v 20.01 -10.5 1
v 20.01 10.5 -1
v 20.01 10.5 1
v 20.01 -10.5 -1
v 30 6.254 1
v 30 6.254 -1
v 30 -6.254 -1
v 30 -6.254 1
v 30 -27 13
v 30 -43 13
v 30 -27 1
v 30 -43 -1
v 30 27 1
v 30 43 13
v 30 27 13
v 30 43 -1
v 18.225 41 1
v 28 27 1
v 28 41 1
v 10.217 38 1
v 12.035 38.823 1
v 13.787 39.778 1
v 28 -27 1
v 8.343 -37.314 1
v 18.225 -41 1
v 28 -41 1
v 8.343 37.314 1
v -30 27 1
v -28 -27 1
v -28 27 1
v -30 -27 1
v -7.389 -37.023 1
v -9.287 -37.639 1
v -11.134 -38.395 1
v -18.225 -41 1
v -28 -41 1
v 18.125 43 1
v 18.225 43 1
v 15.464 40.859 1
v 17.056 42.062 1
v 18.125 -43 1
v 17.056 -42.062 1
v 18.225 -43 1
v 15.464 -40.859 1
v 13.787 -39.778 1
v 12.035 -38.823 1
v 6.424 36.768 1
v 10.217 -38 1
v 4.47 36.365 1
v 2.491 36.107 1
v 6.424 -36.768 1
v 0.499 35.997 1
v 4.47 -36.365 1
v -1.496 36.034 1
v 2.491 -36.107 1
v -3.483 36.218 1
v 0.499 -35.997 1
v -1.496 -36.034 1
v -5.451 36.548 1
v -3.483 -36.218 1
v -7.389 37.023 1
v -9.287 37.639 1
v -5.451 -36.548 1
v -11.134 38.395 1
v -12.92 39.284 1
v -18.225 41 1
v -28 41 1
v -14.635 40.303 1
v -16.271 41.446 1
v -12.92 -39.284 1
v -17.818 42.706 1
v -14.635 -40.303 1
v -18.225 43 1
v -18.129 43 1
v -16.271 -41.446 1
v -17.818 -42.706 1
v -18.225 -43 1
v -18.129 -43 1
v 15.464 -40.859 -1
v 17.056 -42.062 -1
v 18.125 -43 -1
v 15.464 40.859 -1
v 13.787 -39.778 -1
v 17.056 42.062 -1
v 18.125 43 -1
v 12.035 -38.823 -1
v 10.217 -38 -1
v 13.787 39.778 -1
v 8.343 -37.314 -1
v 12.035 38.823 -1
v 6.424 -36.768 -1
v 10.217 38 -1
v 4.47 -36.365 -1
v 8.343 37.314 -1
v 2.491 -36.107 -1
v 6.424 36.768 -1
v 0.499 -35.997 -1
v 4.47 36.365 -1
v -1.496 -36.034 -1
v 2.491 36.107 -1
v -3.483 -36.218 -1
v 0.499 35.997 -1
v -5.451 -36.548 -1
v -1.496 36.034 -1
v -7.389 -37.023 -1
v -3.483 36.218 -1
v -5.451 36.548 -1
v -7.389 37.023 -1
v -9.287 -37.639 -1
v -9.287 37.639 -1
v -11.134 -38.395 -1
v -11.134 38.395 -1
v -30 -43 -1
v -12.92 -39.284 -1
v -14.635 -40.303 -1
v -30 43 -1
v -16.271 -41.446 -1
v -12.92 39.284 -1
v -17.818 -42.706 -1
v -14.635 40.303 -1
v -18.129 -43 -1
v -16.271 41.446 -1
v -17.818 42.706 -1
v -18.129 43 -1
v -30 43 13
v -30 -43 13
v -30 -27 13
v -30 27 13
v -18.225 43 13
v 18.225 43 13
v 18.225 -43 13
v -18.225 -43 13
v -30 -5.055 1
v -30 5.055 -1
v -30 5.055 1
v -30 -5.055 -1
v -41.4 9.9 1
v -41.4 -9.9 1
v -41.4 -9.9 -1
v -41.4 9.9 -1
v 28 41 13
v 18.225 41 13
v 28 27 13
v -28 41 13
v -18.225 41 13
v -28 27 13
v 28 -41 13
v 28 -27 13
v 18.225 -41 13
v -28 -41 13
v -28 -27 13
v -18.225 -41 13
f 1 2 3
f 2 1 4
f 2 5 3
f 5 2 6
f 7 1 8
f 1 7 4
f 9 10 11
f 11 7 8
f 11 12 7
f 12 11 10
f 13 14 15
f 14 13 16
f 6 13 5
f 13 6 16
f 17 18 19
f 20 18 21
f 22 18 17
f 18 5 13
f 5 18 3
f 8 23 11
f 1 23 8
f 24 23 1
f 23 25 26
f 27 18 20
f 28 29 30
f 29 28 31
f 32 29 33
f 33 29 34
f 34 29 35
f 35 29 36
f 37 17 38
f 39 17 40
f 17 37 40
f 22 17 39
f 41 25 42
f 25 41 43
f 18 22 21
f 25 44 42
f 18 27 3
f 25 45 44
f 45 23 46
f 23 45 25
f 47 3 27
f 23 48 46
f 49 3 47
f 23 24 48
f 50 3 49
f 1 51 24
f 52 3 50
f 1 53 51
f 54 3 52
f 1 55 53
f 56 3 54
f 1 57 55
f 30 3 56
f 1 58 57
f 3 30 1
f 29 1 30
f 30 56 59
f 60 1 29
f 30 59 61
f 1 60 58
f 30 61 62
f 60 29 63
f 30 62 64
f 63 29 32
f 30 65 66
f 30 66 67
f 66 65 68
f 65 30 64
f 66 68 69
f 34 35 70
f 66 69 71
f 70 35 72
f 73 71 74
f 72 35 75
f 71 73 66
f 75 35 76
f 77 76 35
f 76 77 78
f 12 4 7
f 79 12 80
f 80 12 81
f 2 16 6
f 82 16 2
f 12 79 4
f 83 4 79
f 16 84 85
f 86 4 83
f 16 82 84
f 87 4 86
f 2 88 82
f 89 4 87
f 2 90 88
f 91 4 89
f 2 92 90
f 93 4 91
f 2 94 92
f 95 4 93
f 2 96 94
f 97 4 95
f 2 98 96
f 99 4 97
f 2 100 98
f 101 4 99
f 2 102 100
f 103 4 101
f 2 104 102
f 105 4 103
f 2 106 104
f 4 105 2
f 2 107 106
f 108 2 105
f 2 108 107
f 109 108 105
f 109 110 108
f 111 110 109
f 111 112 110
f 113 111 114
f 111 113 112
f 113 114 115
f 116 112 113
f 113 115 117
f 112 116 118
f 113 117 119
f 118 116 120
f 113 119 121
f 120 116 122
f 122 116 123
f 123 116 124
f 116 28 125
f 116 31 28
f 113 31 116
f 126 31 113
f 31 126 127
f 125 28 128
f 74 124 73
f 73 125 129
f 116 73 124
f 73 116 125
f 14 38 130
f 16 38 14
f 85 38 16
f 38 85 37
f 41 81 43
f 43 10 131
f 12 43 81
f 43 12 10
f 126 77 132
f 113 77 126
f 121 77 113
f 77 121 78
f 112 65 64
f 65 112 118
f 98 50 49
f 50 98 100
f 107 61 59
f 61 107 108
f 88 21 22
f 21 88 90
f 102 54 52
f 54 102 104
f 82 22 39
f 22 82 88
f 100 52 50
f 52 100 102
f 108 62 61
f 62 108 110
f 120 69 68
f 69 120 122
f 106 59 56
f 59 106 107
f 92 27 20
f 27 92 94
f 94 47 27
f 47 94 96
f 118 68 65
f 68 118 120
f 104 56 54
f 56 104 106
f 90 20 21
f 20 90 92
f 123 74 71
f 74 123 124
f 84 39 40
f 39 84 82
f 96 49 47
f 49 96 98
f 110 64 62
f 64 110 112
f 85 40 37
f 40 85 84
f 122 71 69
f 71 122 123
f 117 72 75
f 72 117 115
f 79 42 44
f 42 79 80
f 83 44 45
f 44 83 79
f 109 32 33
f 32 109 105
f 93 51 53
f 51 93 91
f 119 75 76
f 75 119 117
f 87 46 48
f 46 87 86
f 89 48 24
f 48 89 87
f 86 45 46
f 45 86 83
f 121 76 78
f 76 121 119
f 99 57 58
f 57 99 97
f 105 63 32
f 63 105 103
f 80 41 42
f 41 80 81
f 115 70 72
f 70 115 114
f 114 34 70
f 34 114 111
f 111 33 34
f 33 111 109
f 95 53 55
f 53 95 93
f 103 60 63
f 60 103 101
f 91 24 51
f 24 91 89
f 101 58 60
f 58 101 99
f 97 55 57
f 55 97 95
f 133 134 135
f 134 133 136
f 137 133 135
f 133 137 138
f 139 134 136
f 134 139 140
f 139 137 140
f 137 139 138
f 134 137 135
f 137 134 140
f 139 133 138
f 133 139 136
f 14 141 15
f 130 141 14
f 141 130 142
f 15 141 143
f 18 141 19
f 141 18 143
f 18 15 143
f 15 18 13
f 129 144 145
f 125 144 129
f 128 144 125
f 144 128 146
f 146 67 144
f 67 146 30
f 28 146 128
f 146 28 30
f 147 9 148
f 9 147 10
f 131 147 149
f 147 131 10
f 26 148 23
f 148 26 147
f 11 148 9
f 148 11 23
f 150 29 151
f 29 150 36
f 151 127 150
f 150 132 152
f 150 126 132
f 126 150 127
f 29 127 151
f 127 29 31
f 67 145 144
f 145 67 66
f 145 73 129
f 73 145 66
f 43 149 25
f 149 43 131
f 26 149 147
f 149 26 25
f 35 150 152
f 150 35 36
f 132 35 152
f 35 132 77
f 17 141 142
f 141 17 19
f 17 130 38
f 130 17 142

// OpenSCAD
//Settlers game card holder
// 1 to 1 copy of previous blender version but with parameters for changeing dimention

//Constants
card_x = 54; //original 54
card_y = 80; //original 80
card_space = 2; //original 2
wall_thickness = 2; //original 2
plate_height = 2; //original 2
wall_height = 12; //original 12
shortwall_cut = card_x/(card_y/card_x);
shortwall = (card_x-shortwall_cut)/2+wall_thickness+card_space/2;

//Connecting piece
//the "female" part is 21mm at the biggest point and 12.5mm at the smallest and 10mm deep
//the "male" part is  19.8mm at the biggest point and 10.46mm at smallest and 11.4mm long
//the odd numbers are because i used a manualy freehand modifed box with no real grid snapping, and some random scaling
female_con_x = 10;
female_con_y1 = 21;
female_con_y2 = 12.5;
male_con_x = 11.4;
male_con_y1 = 19.8;
male_con_y2 = 10.46;
angle = atan( ((female_con_y1-female_con_y2)/2) / female_con_x ); // same for both


union() {

	difference() {
		//Base plate
		cube(size = [card_x+card_space+wall_thickness*2, card_y+card_space+wall_thickness*2,plate_height], center = true);
		//Round Cut
		// was made with a cylinder with radius=32 scaled in x and y by 0.8, resulting in R=25.6 and that is aprox card_x
		translate([0,card_y/1.27,-card_x/4])
		cylinder(card_x/2, card_x/2, card_x/2, $fa=2);
		translate([0,-card_y/1.27,-card_x/4])
		cylinder(card_x/2, card_x/2, card_x/2, $fa=2);
		
		//female con
		translate( [ (card_x/2) - female_con_x + card_space/2 + wall_thickness +0.01 , -female_con_y1/2, -plate_height ] ) //0.01 is for overlapping
		difference() {
			cube(size = [female_con_x, female_con_y1, plate_height*2], center = false);
			translate( [ 0,female_con_y1,-1 ] )
			rotate([0, 0, -angle])
			cube(female_con_x*2);
			translate( [ 0,0,-1 ] )
			rotate([0, 0, angle-90])
			cube(female_con_x*2);
		}

	}

	//male con
	translate( [ -(card_x/2) - card_space/2 - wall_thickness - male_con_x, -male_con_y1/2, -plate_height/2 ] ) 
	difference() {
		cube(size = [male_con_x, male_con_y1, plate_height], center = false);
		translate( [ 0,male_con_y1,-1 ] )
		rotate([0, 0, -angle])
		cube(male_con_x*2);
		translate( [ 0,0,-1 ] )
		rotate([0, 0, angle-90])
		cube(male_con_x*2);
	}

	//Cards for reference
	//%cube(size = [card_x,card_y,9], center = true);
	//%cube(size = [card_y,card_x,9], center = true);
	
	//%cube(size= [shortwall_cut, 100,20], center = true);
	
	// Long wall 1 of 4
	translate([  (card_x+card_space+wall_thickness*2)/2 , (card_y+card_space+wall_thickness*2)/2 ,plate_height/2])
	rotate([0,0,180])
	cube(size = [wall_thickness,(card_y-card_x)/2+wall_thickness+card_space/2,wall_height] ,center = false);
	
	// Long wall 2 of 4
	translate([  -(card_x+card_space+wall_thickness*2)/2 +wall_thickness , (card_y+card_space+wall_thickness*2)/2 ,plate_height/2])
	rotate([0,0,180])
	cube(size = [wall_thickness,(card_y-card_x)/2+wall_thickness+card_space/2,wall_height] ,center = false);
	
	// Long wall 3 of 4
	translate([  (card_x+card_space+wall_thickness*2)/2 -wall_thickness, -(card_y+card_space+wall_thickness*2)/2 ,plate_height/2])
	rotate([0,0,0])
	cube(size = [wall_thickness,(card_y-card_x)/2+wall_thickness+card_space/2,wall_height] ,center = false);
	
	// Long wall 4 of 4
	translate([  -(card_x+card_space+wall_thickness*2)/2 , -(card_y+card_space+wall_thickness*2)/2 ,plate_height/2])
	rotate([0,0,0])
	cube(size = [wall_thickness,(card_y-card_x)/2+wall_thickness+card_space/2,wall_height] ,center = false);
	
	//Shortwall 1 of 4
	//the cut to make the space between the walls was originaly 37mm
	translate([  -(card_x+card_space+wall_thickness*2)/2  , (card_y+card_space+wall_thickness*2)/2 ,plate_height/2])
	rotate([0,0,270])
	cube(size = [wall_thickness, shortwall , wall_height] ,center = false);
	
	//Shortwall 2 of 4
	//the cut to make the space between the walls was originaly 37mm
	translate([  (card_x+card_space+wall_thickness*2)/2 , -(card_y+card_space+wall_thickness*2)/2 ,plate_height/2])
	rotate([0,0,90])
	cube(size = [wall_thickness, shortwall , wall_height] ,center = false);
	
	//Shortwall 3 of 4
	//the cut to make the space between the walls was originaly 37mm
	translate([  -(card_x+card_space+wall_thickness*2)/2 , -(card_y+card_space+wall_thickness*2)/2 +wall_thickness ,plate_height/2])
	rotate([0,0,270])
	cube(size = [wall_thickness, shortwall , wall_height] ,center = false);
	
	//Shortwall 4 of 4
	//the cut to make the space between the walls was originaly 37mm
	translate([  (card_x+card_space+wall_thickness*2)/2 , (card_y+card_space+wall_thickness*2)/2 -wall_thickness ,plate_height/2])
	rotate([0,0,90])
	cube(size = [wall_thickness, shortwall , wall_height] ,center = false);
	

}
